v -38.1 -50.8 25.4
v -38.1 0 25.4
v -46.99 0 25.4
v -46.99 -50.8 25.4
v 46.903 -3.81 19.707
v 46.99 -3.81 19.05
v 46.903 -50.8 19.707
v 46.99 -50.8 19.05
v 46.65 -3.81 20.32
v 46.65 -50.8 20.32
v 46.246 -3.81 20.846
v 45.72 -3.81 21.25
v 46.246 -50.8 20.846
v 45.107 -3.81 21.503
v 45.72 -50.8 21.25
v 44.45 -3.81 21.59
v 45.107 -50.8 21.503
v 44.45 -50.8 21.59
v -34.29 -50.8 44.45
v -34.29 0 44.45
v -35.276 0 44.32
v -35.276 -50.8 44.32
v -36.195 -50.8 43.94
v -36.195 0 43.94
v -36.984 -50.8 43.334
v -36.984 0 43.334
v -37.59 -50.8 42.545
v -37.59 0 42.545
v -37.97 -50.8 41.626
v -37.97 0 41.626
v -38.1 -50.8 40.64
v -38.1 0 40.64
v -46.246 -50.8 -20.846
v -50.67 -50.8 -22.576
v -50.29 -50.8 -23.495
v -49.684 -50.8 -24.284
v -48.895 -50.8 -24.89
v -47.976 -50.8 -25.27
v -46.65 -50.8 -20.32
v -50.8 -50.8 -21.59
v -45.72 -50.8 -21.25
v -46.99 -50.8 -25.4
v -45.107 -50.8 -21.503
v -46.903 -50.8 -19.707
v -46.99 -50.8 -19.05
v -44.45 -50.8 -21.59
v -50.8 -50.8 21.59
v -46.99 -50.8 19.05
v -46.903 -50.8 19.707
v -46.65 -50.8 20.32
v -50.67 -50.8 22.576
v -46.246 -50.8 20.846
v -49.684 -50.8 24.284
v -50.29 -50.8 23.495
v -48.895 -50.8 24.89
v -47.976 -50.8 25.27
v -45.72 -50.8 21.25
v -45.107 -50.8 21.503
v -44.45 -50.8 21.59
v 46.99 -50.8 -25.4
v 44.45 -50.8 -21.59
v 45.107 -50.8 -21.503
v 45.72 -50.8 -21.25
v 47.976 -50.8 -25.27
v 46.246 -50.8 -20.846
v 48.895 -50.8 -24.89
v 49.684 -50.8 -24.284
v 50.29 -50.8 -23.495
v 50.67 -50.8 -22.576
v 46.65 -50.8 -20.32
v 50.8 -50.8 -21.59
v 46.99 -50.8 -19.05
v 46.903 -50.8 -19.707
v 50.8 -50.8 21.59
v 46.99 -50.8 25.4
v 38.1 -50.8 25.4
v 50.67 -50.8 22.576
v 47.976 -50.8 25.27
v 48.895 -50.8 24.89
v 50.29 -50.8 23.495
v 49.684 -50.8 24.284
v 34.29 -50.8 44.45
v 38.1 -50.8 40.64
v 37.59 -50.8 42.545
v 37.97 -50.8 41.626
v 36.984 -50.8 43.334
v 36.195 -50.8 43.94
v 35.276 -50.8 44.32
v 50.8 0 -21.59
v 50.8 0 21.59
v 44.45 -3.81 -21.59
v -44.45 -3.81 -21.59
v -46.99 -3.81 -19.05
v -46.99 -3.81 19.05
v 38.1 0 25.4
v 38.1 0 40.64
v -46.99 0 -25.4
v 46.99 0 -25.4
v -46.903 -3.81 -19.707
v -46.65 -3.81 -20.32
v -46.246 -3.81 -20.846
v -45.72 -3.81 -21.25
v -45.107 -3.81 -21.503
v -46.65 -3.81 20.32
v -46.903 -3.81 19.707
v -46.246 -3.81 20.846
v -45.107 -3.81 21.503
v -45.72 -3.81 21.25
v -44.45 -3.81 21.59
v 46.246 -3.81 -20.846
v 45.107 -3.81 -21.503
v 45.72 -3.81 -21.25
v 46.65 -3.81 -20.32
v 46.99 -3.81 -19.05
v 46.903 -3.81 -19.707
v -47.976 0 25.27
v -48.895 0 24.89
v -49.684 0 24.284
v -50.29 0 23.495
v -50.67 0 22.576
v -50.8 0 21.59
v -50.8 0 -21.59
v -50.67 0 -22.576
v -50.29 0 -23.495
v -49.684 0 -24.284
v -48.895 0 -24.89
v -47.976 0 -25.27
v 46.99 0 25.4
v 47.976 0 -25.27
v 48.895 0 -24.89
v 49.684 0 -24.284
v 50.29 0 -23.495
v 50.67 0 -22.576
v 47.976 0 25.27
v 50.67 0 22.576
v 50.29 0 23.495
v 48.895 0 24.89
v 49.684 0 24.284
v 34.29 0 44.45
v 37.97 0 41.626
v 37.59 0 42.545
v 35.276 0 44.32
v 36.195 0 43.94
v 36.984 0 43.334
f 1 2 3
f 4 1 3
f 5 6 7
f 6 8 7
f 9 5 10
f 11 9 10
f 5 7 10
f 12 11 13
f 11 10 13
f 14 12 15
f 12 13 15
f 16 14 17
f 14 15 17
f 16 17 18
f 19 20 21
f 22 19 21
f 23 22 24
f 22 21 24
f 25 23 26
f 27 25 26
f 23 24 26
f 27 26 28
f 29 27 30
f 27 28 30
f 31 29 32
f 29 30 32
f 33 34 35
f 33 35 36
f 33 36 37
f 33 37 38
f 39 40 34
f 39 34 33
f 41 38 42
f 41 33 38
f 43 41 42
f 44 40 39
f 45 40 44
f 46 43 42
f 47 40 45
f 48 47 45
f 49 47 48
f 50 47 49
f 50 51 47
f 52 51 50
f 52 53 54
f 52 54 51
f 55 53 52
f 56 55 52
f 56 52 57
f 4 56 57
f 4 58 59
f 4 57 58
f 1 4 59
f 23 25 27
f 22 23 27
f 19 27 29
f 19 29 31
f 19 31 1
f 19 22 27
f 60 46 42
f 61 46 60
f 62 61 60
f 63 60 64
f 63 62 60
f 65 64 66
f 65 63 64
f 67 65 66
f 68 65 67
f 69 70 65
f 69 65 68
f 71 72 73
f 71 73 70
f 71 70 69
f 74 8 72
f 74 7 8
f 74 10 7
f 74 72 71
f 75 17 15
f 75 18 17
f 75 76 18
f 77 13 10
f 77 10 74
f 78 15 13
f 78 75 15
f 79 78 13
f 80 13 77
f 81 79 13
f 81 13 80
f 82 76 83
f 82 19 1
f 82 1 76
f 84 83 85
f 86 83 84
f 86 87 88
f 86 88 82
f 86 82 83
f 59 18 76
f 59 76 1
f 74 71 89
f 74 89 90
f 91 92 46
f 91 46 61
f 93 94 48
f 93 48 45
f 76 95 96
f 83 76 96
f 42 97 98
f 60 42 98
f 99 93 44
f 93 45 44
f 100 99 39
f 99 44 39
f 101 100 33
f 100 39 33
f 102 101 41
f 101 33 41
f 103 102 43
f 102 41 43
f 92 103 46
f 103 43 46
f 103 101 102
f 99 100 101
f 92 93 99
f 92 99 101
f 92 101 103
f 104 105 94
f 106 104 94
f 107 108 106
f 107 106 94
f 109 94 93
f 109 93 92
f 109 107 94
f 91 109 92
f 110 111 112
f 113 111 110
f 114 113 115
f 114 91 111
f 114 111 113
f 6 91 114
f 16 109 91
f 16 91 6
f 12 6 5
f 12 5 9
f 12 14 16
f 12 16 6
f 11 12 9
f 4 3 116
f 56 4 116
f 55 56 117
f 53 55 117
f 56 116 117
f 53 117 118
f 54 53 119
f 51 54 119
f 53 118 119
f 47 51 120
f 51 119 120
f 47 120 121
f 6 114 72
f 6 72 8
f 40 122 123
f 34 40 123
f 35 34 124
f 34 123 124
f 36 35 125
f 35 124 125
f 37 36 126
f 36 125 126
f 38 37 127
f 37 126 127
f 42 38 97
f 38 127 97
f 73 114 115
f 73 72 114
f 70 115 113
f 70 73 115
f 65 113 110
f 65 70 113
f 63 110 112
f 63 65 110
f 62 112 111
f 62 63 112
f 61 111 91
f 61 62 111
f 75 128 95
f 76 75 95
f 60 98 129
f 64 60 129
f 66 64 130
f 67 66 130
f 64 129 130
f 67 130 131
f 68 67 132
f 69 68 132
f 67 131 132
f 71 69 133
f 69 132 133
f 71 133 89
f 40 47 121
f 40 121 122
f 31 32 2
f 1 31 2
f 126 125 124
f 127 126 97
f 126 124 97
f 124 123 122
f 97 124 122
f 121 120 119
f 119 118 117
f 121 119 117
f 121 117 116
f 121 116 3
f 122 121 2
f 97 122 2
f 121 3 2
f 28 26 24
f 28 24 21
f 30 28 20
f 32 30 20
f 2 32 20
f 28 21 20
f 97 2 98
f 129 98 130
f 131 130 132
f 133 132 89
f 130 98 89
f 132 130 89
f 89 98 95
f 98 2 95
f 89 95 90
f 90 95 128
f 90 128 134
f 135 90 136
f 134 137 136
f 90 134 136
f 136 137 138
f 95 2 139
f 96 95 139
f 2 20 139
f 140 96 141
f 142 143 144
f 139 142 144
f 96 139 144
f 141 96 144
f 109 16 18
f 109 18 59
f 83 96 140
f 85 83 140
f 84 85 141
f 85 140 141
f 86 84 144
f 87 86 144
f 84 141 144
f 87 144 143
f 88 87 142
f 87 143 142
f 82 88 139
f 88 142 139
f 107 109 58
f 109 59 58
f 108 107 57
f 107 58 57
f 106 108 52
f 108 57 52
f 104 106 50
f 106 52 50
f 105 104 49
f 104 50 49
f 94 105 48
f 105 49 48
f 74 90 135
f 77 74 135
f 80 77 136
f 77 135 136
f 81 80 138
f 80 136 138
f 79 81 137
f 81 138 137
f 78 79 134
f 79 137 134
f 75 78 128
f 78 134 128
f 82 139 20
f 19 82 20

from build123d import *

# Parameters (mm, degrees)
F1_DEPTH = 50.8
F2_T     = 3.81
F3_R     = 2.54
F4_DEPTH = 50.8


# Not quite as in the source:
# - a shell that OpenCascade refuses in one call is made with other operations: the cavity is built on its own and cut out


with BuildPart() as f1:
    # F0 (on Front) → F1 (new body)
    with BuildSketch(Plane.XZ):
        with BuildLine():
            ThreePointArc((50.8, 21.59), (49.6840768363, 24.2840768363), (46.99, 25.4))
            Line((46.99, 25.4), (38.1, 25.4))
            Line((38.1, 25.4), (-38.1, 25.4))
            Line((-38.1, 25.4), (-46.99, 25.4))
            ThreePointArc((-46.99, 25.4), (-49.6840768363, 24.2840768363), (-50.8, 21.59))
            Line((-50.8, 21.59), (-50.8, -21.59))
            ThreePointArc((-50.8, -21.59), (-49.6840768363, -24.2840768363), (-46.99, -25.4))
            Line((-46.99, -25.4), (46.99, -25.4))
            ThreePointArc((46.99, -25.4), (49.6840768363, -24.2840768363), (50.8, -21.59))
            Line((50.8, -21.59), (50.8, 21.59))
        make_face()
    extrude(amount=F1_DEPTH)

    # F2: shell of thickness 3.81, made by hand


with BuildPart() as f2_core1:
    # F2_t2: copy of F1
    add(f1.part)

    # the walls: a layer under each face that stays
    f2_faces = [f2_core1.faces().sort_by_distance(p)[0] for p in [
        (0, -25.4, -25.4),
        (-50.8, -25.4, 0),
        (0, 0, 0),
        (0, -25.4, 25.4),
        (50.8, -25.4, 0),
    ]]
    thicken(f2_faces, amount=-F2_T, mode=Mode.SUBTRACT)


with BuildPart() as f1_1:
    add(f1.part)

    # what is left inside the walls is the cavity
    f2_cavity = [f2_core1.part.solids().sort_by_distance(p)[0] for p in [
        (0, -35.136667, -21.5519),
    ]]
    add(f2_cavity, mode=Mode.SUBTRACT)

    # F3
    f3_edges = [f1_1.edges().sort_by_distance(p)[0] for p in [
        (-46.99, -27.305, 21.59),
        (-46.99, -27.305, -21.59),
        (46.99, -27.305, -21.59),
        (46.99, -27.305, 21.59),
    ]]
    fillet(f3_edges, radius=F3_R)

    # F0 (on Front) → F4 (join)
    with BuildSketch(Plane.XZ):
        with BuildLine():
            Line((-38.1, 25.4), (38.1, 25.4))
            Line((38.1, 25.4), (38.1, 40.64))
            ThreePointArc((38.1, 40.64), (36.9840768363, 43.3340768363), (34.29, 44.45))
            Line((34.29, 44.45), (0, 44.45))
            Line((0, 44.45), (-34.29, 44.45))
            ThreePointArc((-34.29, 44.45), (-36.9840768363, 43.3340768363), (-38.1, 40.64))
            Line((-38.1, 40.64), (-38.1, 25.4))
        make_face()
    extrude(amount=F4_DEPTH)


solid = f1_1.part
